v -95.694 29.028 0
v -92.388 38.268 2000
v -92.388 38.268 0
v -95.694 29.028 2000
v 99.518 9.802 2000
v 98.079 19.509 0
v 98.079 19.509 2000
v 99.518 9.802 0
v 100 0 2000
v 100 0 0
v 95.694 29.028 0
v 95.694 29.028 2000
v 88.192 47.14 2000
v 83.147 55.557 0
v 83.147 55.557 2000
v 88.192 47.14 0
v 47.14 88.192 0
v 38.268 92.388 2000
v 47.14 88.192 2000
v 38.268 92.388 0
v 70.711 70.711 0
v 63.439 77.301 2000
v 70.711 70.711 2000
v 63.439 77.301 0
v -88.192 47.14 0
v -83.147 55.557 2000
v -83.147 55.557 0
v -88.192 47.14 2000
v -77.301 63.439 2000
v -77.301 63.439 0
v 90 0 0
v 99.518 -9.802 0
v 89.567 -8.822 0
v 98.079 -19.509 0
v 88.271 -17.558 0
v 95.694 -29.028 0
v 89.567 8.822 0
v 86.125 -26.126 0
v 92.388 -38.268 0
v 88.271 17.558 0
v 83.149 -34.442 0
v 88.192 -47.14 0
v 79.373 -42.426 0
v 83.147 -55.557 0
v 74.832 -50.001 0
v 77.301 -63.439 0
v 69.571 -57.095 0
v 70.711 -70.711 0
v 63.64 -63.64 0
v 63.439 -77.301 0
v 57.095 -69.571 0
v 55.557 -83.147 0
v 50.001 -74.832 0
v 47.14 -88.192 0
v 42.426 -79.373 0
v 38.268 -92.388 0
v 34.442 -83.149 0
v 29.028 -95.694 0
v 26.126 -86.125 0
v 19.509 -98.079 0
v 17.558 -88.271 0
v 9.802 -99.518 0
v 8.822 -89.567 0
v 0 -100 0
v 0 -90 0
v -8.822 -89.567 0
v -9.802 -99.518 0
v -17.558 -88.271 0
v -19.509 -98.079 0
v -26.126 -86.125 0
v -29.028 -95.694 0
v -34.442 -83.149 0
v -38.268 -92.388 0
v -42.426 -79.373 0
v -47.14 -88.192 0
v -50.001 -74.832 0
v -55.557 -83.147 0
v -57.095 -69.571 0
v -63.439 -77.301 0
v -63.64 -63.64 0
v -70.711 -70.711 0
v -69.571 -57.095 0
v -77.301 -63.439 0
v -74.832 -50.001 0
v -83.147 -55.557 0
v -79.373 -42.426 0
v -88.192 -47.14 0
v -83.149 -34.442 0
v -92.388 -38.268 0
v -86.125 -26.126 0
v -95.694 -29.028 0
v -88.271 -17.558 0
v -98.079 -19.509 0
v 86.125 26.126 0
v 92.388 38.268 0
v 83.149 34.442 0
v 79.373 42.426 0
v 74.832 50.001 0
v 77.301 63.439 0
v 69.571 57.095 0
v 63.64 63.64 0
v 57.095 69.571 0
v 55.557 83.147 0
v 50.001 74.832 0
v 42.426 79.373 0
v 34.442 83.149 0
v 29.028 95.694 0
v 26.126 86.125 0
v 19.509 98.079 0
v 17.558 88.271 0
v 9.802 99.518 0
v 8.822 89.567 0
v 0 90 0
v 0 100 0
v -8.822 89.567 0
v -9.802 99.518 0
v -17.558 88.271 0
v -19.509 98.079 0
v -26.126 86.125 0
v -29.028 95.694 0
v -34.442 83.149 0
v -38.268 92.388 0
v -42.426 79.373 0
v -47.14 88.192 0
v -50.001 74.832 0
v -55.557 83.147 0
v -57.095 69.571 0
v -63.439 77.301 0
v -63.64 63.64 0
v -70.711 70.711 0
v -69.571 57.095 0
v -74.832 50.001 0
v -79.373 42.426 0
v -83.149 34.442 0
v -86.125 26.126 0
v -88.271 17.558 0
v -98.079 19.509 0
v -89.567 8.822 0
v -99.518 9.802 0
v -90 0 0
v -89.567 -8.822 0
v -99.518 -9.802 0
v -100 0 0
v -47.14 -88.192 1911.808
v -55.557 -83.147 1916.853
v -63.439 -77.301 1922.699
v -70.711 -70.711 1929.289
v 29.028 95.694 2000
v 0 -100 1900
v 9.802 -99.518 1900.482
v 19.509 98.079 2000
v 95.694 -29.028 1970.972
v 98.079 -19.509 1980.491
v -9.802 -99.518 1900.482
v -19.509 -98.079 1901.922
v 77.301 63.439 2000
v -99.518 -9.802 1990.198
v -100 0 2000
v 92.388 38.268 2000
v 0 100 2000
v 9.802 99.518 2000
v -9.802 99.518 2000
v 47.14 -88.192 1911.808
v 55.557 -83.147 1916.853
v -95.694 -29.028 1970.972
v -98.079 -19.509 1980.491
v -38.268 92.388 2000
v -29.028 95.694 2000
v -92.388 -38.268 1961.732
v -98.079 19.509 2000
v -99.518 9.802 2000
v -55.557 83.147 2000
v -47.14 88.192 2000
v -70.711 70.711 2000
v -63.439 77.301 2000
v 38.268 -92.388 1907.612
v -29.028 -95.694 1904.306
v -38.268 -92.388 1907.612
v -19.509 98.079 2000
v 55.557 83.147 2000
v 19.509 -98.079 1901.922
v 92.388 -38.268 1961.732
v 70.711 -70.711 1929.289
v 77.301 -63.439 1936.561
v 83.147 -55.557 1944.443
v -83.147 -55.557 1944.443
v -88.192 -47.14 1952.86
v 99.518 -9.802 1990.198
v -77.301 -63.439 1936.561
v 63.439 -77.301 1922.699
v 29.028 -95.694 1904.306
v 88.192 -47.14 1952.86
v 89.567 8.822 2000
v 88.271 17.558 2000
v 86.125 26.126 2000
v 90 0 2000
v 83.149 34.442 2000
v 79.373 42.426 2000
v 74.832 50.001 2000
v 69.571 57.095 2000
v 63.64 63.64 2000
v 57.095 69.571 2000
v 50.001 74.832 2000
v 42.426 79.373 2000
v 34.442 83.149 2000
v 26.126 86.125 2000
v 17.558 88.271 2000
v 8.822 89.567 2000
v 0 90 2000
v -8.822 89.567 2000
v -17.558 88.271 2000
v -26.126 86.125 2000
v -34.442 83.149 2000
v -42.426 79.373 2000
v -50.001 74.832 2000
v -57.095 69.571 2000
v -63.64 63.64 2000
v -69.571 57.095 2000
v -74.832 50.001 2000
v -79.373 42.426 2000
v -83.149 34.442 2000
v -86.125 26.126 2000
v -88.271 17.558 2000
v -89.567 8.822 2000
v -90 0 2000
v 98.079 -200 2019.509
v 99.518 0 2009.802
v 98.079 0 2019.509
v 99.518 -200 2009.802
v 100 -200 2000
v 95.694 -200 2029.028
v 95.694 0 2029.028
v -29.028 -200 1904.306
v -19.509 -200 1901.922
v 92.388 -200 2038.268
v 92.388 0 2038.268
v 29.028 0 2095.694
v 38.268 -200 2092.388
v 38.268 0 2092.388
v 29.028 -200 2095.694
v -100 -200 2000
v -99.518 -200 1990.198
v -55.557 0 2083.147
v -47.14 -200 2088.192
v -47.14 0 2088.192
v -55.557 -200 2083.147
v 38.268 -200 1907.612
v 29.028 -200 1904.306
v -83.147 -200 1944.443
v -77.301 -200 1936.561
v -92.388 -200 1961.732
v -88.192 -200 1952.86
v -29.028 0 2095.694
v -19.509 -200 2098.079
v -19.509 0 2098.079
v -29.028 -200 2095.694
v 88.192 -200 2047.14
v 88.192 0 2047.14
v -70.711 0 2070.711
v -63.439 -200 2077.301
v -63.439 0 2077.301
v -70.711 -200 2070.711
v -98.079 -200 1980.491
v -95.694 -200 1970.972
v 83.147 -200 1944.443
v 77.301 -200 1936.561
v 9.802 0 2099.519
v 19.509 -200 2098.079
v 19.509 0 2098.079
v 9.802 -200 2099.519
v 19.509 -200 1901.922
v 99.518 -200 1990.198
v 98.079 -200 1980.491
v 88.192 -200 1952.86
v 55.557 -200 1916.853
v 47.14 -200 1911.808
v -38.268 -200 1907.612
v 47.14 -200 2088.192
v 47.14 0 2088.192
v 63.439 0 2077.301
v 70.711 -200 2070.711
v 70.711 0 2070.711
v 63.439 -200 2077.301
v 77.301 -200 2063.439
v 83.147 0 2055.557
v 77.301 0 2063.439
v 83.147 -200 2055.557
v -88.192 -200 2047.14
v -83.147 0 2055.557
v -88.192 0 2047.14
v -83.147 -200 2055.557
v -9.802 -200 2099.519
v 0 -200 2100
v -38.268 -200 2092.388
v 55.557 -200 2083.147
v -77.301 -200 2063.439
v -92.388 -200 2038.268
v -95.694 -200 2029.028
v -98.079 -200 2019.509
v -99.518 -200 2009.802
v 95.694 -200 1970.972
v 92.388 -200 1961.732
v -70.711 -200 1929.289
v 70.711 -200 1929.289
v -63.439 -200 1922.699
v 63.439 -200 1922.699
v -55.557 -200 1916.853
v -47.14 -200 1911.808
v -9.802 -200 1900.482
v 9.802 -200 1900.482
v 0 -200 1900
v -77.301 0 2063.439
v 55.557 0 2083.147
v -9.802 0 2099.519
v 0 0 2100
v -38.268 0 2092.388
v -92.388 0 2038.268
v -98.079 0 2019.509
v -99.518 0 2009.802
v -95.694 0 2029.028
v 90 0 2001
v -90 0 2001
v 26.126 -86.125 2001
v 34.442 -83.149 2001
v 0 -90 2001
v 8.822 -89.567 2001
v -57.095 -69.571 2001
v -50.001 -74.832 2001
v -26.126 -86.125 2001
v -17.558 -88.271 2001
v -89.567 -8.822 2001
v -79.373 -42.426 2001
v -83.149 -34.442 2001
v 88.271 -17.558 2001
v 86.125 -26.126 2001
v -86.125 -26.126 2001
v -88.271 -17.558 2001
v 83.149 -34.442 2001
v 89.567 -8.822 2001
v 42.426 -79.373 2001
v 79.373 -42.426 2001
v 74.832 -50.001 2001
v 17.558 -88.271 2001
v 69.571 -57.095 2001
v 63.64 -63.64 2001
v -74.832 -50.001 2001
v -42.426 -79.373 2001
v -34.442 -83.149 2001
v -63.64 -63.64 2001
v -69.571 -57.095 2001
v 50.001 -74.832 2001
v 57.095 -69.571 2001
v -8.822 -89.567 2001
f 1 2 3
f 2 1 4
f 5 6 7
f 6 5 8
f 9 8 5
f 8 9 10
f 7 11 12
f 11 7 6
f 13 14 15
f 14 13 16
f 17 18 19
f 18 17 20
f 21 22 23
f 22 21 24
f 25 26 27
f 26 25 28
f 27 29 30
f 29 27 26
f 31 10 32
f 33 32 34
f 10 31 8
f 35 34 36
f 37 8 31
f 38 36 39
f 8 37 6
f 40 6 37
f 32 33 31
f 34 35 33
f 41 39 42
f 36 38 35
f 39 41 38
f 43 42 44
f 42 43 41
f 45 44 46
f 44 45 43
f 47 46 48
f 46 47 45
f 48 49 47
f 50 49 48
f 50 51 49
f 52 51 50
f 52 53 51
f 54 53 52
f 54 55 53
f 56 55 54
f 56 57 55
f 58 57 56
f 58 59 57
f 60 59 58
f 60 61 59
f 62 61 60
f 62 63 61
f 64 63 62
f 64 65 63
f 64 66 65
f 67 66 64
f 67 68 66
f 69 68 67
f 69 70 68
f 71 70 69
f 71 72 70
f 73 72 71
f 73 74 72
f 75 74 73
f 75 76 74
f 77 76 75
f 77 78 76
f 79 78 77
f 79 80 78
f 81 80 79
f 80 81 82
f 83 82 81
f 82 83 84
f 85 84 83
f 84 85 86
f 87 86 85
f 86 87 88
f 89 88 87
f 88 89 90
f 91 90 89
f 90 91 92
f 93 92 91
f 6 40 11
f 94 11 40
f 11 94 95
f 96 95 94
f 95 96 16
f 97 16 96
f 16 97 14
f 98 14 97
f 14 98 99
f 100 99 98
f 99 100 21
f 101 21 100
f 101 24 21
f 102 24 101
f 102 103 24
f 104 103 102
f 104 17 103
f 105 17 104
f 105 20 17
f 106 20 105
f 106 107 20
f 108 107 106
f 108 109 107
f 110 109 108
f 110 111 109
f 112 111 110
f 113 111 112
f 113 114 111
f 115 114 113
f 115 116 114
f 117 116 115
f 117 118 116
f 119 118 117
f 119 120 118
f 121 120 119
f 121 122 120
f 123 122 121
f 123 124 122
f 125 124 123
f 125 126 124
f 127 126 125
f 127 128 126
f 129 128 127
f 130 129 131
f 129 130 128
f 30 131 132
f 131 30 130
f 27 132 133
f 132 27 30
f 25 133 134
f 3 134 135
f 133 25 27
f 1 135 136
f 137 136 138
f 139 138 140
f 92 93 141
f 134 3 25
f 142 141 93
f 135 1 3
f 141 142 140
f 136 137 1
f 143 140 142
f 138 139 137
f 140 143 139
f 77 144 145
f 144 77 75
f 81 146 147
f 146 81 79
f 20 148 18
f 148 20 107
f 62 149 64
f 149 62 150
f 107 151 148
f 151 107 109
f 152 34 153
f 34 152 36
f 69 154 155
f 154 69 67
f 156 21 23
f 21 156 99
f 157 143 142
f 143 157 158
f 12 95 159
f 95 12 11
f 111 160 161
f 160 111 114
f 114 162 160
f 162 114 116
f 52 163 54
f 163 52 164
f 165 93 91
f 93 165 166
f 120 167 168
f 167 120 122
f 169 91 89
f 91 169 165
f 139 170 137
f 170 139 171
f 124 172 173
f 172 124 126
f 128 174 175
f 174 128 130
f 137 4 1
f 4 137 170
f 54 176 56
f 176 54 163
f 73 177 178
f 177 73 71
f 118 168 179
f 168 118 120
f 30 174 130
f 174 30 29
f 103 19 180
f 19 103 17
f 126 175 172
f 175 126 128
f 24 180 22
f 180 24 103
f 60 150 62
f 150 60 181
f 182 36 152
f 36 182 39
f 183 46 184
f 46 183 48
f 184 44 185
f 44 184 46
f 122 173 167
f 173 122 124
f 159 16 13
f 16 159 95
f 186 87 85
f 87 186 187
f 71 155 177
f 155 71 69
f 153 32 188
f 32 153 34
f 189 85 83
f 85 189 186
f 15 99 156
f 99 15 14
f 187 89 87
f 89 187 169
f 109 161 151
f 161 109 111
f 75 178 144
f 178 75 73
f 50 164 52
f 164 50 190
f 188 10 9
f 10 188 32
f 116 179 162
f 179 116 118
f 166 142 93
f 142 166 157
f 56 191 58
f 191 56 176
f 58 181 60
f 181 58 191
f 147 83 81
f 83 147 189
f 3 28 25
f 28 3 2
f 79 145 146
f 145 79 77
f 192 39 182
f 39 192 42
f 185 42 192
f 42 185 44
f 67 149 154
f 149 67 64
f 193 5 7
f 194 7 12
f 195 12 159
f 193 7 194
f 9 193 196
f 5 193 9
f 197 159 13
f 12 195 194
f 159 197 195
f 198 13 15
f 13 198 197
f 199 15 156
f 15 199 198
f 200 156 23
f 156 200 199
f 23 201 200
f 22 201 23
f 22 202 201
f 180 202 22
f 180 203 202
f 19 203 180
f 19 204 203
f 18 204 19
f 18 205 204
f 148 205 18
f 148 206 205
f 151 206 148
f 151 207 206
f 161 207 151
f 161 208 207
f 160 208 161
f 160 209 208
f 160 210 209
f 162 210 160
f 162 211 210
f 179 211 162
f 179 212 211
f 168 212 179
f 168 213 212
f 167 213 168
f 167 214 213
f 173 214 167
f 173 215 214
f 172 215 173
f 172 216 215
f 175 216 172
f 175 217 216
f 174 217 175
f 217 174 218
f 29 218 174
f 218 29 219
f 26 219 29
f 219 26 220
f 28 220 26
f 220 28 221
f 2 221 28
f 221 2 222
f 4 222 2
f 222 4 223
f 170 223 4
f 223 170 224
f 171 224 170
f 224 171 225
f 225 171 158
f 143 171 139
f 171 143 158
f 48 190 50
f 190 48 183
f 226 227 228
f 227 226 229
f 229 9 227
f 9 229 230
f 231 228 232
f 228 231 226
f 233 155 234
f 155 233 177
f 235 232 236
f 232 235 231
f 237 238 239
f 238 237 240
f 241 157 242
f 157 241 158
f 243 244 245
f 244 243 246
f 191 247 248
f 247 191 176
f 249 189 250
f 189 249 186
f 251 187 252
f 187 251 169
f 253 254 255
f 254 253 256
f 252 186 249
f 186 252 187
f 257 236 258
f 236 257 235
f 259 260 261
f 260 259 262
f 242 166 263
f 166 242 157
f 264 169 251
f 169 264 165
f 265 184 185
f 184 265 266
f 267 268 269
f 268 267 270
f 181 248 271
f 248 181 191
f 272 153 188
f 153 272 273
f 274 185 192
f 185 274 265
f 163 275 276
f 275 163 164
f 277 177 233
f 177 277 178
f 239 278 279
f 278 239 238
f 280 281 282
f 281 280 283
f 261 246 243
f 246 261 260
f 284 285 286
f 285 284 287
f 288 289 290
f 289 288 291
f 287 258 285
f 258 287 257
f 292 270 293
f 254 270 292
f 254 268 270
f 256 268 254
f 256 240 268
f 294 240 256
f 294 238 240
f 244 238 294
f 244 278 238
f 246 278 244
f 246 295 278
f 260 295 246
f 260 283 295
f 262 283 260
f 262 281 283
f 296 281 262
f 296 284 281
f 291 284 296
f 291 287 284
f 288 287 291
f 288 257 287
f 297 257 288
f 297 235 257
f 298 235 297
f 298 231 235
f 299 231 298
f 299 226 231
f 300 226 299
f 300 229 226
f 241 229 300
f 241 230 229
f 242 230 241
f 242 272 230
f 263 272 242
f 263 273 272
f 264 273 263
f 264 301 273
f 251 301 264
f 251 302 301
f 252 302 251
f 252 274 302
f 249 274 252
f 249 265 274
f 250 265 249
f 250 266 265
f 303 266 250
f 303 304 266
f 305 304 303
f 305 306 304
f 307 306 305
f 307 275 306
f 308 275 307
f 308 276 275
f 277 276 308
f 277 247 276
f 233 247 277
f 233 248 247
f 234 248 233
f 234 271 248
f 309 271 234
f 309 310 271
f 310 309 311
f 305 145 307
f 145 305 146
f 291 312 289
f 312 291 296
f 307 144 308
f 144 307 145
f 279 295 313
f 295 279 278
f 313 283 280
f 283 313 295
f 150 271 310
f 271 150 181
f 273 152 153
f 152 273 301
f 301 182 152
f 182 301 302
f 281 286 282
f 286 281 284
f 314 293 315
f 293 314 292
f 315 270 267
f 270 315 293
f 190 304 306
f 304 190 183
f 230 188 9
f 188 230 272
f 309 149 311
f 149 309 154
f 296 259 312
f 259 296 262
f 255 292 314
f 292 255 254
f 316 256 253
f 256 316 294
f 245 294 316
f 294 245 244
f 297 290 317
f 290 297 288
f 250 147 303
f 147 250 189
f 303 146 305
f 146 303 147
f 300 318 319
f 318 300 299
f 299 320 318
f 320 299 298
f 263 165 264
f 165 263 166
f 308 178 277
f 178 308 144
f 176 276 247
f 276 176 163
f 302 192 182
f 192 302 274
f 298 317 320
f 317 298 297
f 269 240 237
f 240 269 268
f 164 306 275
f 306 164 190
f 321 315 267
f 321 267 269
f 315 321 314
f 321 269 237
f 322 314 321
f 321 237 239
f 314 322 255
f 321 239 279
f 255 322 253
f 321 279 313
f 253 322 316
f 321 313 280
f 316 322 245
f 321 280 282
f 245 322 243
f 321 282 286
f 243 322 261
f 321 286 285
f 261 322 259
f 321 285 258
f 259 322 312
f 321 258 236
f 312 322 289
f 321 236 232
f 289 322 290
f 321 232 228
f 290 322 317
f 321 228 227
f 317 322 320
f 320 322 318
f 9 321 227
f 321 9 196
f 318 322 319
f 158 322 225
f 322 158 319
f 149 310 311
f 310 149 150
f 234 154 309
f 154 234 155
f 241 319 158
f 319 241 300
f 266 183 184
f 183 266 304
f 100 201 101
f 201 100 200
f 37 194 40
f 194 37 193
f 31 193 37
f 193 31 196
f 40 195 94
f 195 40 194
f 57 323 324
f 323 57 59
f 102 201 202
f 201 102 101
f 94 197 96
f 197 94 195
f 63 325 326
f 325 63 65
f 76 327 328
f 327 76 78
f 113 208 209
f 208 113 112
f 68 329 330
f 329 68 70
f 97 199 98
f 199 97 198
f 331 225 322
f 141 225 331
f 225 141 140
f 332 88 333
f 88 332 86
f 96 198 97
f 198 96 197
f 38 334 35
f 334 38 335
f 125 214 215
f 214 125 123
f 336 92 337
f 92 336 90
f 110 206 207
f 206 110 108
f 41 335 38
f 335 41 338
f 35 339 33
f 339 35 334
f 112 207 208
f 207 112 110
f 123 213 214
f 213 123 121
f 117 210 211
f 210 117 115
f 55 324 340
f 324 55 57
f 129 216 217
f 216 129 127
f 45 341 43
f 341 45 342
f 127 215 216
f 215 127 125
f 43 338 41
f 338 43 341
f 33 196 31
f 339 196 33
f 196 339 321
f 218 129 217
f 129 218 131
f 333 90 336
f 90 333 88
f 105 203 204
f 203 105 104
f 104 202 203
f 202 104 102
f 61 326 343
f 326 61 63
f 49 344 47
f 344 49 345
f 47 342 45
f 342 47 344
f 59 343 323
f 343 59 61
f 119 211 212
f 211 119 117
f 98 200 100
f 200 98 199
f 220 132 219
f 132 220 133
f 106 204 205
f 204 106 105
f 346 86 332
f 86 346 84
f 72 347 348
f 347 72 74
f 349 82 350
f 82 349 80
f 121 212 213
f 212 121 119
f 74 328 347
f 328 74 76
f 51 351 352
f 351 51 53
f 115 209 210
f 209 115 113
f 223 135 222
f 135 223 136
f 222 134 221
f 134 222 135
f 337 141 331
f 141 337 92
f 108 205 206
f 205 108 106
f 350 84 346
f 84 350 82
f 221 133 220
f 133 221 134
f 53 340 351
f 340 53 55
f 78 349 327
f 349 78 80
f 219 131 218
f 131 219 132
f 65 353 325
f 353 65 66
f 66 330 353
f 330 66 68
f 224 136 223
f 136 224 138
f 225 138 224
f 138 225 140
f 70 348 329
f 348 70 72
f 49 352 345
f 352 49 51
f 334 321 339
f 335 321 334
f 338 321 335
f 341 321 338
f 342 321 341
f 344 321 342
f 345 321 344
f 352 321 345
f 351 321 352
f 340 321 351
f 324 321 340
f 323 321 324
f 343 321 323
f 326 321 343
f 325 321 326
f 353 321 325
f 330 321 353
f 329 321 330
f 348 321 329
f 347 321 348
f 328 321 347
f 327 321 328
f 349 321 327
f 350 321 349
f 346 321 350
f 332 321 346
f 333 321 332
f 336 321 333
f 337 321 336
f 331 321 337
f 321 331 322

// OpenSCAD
module ht_pipe() {
    difference() {
        union() {
            cylinder(h=2000, r=100, $fn=64);
            translate([0, 0, 2000])
                rotate([90, 0, 0])
                cylinder(h=200, r=100, $fn=64);
        }
        translate([0, 0, -1])
            cylinder(h=2002, r=90, $fn=64);
    }
}

ht_pipe();
